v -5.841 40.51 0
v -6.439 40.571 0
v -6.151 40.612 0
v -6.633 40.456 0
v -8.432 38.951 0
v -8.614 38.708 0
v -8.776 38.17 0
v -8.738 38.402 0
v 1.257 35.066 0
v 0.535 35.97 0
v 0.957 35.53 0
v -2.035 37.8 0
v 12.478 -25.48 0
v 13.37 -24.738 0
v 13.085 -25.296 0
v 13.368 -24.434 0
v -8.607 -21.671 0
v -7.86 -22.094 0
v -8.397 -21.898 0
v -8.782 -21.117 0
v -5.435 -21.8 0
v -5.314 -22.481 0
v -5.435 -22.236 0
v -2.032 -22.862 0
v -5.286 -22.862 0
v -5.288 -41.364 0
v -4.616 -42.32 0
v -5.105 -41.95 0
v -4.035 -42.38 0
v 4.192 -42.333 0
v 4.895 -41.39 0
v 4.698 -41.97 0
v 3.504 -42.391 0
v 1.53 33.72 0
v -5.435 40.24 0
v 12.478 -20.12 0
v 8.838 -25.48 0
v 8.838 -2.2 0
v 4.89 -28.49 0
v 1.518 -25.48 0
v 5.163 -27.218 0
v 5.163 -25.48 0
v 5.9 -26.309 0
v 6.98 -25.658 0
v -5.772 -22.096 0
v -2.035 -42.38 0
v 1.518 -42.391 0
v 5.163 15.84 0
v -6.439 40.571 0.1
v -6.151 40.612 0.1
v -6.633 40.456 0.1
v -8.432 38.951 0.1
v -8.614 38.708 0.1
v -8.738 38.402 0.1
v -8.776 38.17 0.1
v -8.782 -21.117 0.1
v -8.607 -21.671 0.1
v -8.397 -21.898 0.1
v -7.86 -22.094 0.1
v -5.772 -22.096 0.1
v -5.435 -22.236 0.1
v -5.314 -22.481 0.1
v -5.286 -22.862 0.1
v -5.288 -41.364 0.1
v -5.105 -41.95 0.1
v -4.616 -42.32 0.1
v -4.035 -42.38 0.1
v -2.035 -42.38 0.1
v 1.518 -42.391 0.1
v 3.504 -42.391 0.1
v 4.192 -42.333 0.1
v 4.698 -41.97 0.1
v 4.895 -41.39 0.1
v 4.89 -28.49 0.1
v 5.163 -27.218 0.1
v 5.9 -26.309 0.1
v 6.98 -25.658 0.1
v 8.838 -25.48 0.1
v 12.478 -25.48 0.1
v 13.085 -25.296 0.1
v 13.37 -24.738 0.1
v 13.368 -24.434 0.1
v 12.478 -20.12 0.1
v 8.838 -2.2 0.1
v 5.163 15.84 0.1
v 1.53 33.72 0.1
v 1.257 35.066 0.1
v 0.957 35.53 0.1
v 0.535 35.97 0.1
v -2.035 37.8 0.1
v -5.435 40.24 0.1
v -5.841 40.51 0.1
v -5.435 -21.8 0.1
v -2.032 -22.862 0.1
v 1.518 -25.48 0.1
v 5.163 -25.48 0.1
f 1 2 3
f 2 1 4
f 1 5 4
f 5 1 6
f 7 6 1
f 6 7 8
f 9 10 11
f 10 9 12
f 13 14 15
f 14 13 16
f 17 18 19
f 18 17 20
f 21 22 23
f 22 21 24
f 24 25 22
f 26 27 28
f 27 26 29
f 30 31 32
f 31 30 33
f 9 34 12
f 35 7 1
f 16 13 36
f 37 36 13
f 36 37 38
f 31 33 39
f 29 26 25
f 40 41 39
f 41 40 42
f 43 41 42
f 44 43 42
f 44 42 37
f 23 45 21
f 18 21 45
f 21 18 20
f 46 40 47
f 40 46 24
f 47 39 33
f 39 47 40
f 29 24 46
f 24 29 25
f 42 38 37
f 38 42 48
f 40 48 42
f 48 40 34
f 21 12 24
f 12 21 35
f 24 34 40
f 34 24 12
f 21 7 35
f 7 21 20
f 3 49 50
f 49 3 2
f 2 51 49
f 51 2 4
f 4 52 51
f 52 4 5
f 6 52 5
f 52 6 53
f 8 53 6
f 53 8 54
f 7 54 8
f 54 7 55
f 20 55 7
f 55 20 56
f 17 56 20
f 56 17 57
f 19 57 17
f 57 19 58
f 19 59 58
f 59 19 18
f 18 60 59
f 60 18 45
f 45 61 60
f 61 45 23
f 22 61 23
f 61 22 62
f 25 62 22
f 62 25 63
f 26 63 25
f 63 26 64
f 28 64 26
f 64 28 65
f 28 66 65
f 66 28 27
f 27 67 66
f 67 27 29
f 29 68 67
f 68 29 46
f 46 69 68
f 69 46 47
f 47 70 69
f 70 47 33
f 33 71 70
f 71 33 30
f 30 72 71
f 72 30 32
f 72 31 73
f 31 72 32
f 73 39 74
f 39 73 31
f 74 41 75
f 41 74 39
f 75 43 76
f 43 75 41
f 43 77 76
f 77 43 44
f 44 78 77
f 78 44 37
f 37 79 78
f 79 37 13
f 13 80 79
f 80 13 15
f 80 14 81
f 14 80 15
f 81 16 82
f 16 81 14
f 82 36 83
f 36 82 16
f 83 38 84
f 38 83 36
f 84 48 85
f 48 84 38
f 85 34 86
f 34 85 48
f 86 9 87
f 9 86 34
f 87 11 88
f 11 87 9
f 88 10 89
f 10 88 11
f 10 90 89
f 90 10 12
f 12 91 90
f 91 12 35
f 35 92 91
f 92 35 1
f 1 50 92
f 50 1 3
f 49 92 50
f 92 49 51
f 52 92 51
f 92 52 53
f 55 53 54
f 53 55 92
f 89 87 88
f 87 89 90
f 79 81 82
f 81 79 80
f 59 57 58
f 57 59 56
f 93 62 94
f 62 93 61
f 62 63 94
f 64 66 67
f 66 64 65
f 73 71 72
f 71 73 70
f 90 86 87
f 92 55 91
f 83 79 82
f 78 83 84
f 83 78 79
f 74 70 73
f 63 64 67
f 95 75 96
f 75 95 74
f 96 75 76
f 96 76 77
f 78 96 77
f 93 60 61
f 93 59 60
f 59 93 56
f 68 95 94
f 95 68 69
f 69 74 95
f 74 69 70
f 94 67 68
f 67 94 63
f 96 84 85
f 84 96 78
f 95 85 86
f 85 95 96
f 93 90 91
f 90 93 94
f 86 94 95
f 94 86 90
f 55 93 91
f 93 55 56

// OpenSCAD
// file: ../p/4-4edge.scad
use <../lib.scad>
$fa=1; $fs=0.2;
function ldraw_lib__4_4edge(realsolid=false) = [
// 0 Circle 1.0
// 0 Name: 4-4edge.dat
// 0 Author: James Jessiman
// 0 !LDRAW_ORG Primitive UPDATE 2017-01
// 0 !LICENSE Licensed under CC BY 2.0 and CC BY 4.0 : see CAreadme.txt
// 
// 0 BFC CERTIFY CCW
  [0,"BFC","CERTIFY"],
  [0,"BFC","CCW"],
// 
// 0 !HISTORY 1998-12-15 [PTadmin] Official Update 1998-10
// 0 !HISTORY 2005-12-28 [PTadmin] Official Update 2005-01
// 0 !HISTORY 2007-06-24 [PTadmin] Header formatted for Contributor Agreement
// 0 !HISTORY 2008-07-01 [PTadmin] Official Update 2008-01
// 0 !HISTORY 2017-01-15 [Steffen] BFCed
// 0 !HISTORY 2017-12-30 [PTadmin] Official Update 2017-01
// 
// 
// 2 24 1 0 0 0.9239 0 0.3827
  [2,24,1,0,0,0.9239,0,0.3827],
// 2 24 0.9239 0 0.3827 0.7071 0 0.7071
  [2,24,0.9239,0,0.3827,0.7071,0,0.7071],
// 2 24 0.7071 0 0.7071 0.3827 0 0.9239
  [2,24,0.7071,0,0.7071,0.3827,0,0.9239],
// 2 24 0.3827 0 0.9239 0 0 1
  [2,24,0.3827,0,0.9239,0,0,1],
// 2 24 0 0 1 -0.3827 0 0.9239
  [2,24,0,0,1,-0.3827,0,0.9239],
// 2 24 -0.3827 0 0.9239 -0.7071 0 0.7071
  [2,24,-0.3827,0,0.9239,-0.7071,0,0.7071],
// 2 24 -0.7071 0 0.7071 -0.9239 0 0.3827
  [2,24,-0.7071,0,0.7071,-0.9239,0,0.3827],
// 2 24 -0.9239 0 0.3827 -1 0 -0
  [2,24,-0.9239,0,0.3827,-1,0,-0],
// 2 24 -1 0 -0 -0.9239 0 -0.3827
  [2,24,-1,0,-0,-0.9239,0,-0.3827],
// 2 24 -0.9239 0 -0.3827 -0.7071 0 -0.7071
  [2,24,-0.9239,0,-0.3827,-0.7071,0,-0.7071],
// 2 24 -0.7071 0 -0.7071 -0.3827 0 -0.9239
  [2,24,-0.7071,0,-0.7071,-0.3827,0,-0.9239],
// 2 24 -0.3827 0 -0.9239 0 0 -1
  [2,24,-0.3827,0,-0.9239,0,0,-1],
// 2 24 0 0 -1 0.3827 0 -0.9239
  [2,24,0,0,-1,0.3827,0,-0.9239],
// 2 24 0.3827 0 -0.9239 0.7071 0 -0.7071
  [2,24,0.3827,0,-0.9239,0.7071,0,-0.7071],
// 2 24 0.7071 0 -0.7071 0.9239 0 -0.3827
  [2,24,0.7071,0,-0.7071,0.9239,0,-0.3827],
// 2 24 0.9239 0 -0.3827 1 0 0
  [2,24,0.9239,0,-0.3827,1,0,0],
];
module ldraw_lib__4_4edge(step=0, col=false, unit=2/5, alt=false, line=0.2, solid=!$preview)
    makepoly(ldraw_lib__4_4edge(solid), step=step, col=col, unit=unit, alt=alt, line=line, solid=solid);
ldraw_lib__4_4edge(line=0.2);
// file: ../p/4-4disc.scad
use <../lib.scad>
$fa=1; $fs=0.2;
function ldraw_lib__4_4disc(realsolid=false) = [
// 0 Disc 1.0
// 0 Name: 4-4disc.dat
// 0 Author: James Jessiman
// 0 !LDRAW_ORG Primitive UPDATE 2002-02
// 0 !LICENSE Licensed under CC BY 2.0 and CC BY 4.0 : see CAreadme.txt
// 
// 0 BFC CERTIFY CCW
  [0,"BFC","CERTIFY"],
  [0,"BFC","CCW"],
// 
// 0 !HISTORY 1998-12-15 [PTadmin] Official Update 1998-10
// 0 !HISTORY 2002-03-23 [sbliss] Added BFC statement
// 0 !HISTORY 2002-04-25 [PTadmin] Official Update 2002-02
// 0 !HISTORY 2007-06-24 [PTadmin] Header formatted for Contributor Agreement
// 0 !HISTORY 2008-07-01 [PTadmin] Official Update 2008-01
// 
// 
// 3 16 0 0 0 1 0 0 0.9239 0 0.3827
  [3,16,0,0,0,1,0,0,0.9239,0,0.3827],
// 3 16 0 0 0 0.9239 0 0.3827 0.7071 0 0.7071
  [3,16,0,0,0,0.9239,0,0.3827,0.7071,0,0.7071],
// 3 16 0 0 0 0.7071 0 0.7071 0.3827 0 0.9239
  [3,16,0,0,0,0.7071,0,0.7071,0.3827,0,0.9239],
// 3 16 0 0 0 0.3827 0 0.9239 0 0 1
  [3,16,0,0,0,0.3827,0,0.9239,0,0,1],
// 3 16 0 0 0 0 0 1 -0.3827 0 0.9239
  [3,16,0,0,0,0,0,1,-0.3827,0,0.9239],
// 3 16 0 0 0 -0.3827 0 0.9239 -0.7071 0 0.7071
  [3,16,0,0,0,-0.3827,0,0.9239,-0.7071,0,0.7071],
// 3 16 0 0 0 -0.7071 0 0.7071 -0.9239 0 0.3827
  [3,16,0,0,0,-0.7071,0,0.7071,-0.9239,0,0.3827],
// 3 16 0 0 0 -0.9239 0 0.3827 -1 0 -0
  [3,16,0,0,0,-0.9239,0,0.3827,-1,0,-0],
// 3 16 0 0 0 -1 0 -0 -0.9239 0 -0.3827
  [3,16,0,0,0,-1,0,-0,-0.9239,0,-0.3827],
// 3 16 0 0 0 -0.9239 0 -0.3827 -0.7071 0 -0.7071
  [3,16,0,0,0,-0.9239,0,-0.3827,-0.7071,0,-0.7071],
// 3 16 0 0 0 -0.7071 0 -0.7071 -0.3827 0 -0.9239
  [3,16,0,0,0,-0.7071,0,-0.7071,-0.3827,0,-0.9239],
// 3 16 0 0 0 -0.3827 0 -0.9239 0 0 -1
  [3,16,0,0,0,-0.3827,0,-0.9239,0,0,-1],
// 3 16 0 0 0 0 0 -1 0.3827 0 -0.9239
  [3,16,0,0,0,0,0,-1,0.3827,0,-0.9239],
// 3 16 0 0 0 0.3827 0 -0.9239 0.7071 0 -0.7071
  [3,16,0,0,0,0.3827,0,-0.9239,0.7071,0,-0.7071],
// 3 16 0 0 0 0.7071 0 -0.7071 0.9239 0 -0.3827
  [3,16,0,0,0,0.7071,0,-0.7071,0.9239,0,-0.3827],
// 3 16 0 0 0 0.9239 0 -0.3827 1 0 0
  [3,16,0,0,0,0.9239,0,-0.3827,1,0,0],
// 0
];
module ldraw_lib__4_4disc(step=0, col=false, unit=2/5, alt=false, line=0.2, solid=!$preview)
    makepoly(ldraw_lib__4_4disc(solid), step=step, col=col, unit=unit, alt=alt, line=line, solid=solid);
ldraw_lib__4_4disc(line=0.2);
// file: ../p/4-4cyli.scad
use <../lib.scad>
$fa=1; $fs=0.2;
function ldraw_lib__4_4cyli(realsolid=false) = [
// 0 Cylinder 1.0
// 0 Name: 4-4cyli.dat
// 0 Author: James Jessiman
// 0 !LDRAW_ORG Primitive UPDATE 2005-01
// 0 !LICENSE Licensed under CC BY 2.0 and CC BY 4.0 : see CAreadme.txt
// 
// 0 BFC CERTIFY CCW
  [0,"BFC","CERTIFY"],
  [0,"BFC","CCW"],
// 
// 0 !HISTORY 1998-12-15 [PTadmin] Official Update 1998-10
// 0 !HISTORY 2002-03-23 [sbliss] Added BFC statement; merged headers from files in distributions LDraw 0.27 and Complete.
// 0 !HISTORY 2002-04-25 [PTadmin] Official Update 2002-02
// 0 !HISTORY 2004-12-14 [guyvivan] BFC CCW
// 0 !HISTORY 2005-12-28 [PTadmin] Official Update 2005-01
// 0 !HISTORY 2007-06-24 [PTadmin] Header formatted for Contributor Agreement
// 0 !HISTORY 2008-07-01 [PTadmin] Official Update 2008-01
// 
// 
// 4 16 1 1 0 0.9239 1 0.3827 0.9239 0 0.3827 1 0 0
  [4,16,1,1,0,0.9239,1,0.3827,0.9239,0,0.3827,1,0,0],
// 5 24 1 0 0 1 1 0 0.9239 0 0.3827 0.9239 0 -0.3827
  [5,24,1,0,0,1,1,0,0.9239,0,0.3827,0.9239,0,-0.3827],
// 4 16 0.9239 1 0.3827 0.7071 1 0.7071 0.7071 0 0.7071 0.9239 0 0.3827
  [4,16,0.9239,1,0.3827,0.7071,1,0.7071,0.7071,0,0.7071,0.9239,0,0.3827],
// 5 24 0.9239 0 0.3827 0.9239 1 0.3827 0.7071 0 0.7071 1 0 0
  [5,24,0.9239,0,0.3827,0.9239,1,0.3827,0.7071,0,0.7071,1,0,0],
// 4 16 0.7071 1 0.7071 0.3827 1 0.9239 0.3827 0 0.9239 0.7071 0 0.7071
  [4,16,0.7071,1,0.7071,0.3827,1,0.9239,0.3827,0,0.9239,0.7071,0,0.7071],
// 5 24 0.7071 0 0.7071 0.7071 1 0.7071 0.3827 0 0.9239 0.9239 0 0.3827
  [5,24,0.7071,0,0.7071,0.7071,1,0.7071,0.3827,0,0.9239,0.9239,0,0.3827],
// 4 16 0.3827 1 0.9239 0 1 1 0 0 1 0.3827 0 0.9239
  [4,16,0.3827,1,0.9239,0,1,1,0,0,1,0.3827,0,0.9239],
// 5 24 0.3827 0 0.9239 0.3827 1 0.9239 0 0 1 0.7071 0 0.7071
  [5,24,0.3827,0,0.9239,0.3827,1,0.9239,0,0,1,0.7071,0,0.7071],
// 4 16 0 1 1 -0.3827 1 0.9239 -0.3827 0 0.9239 0 0 1
  [4,16,0,1,1,-0.3827,1,0.9239,-0.3827,0,0.9239,0,0,1],
// 5 24 0 0 1 0 1 1 -0.3827 0 0.9239 0.3827 0 0.9239
  [5,24,0,0,1,0,1,1,-0.3827,0,0.9239,0.3827,0,0.9239],
// 4 16 -0.3827 1 0.9239 -0.7071 1 0.7071 -0.7071 0 0.7071 -0.3827 0 0.9239
  [4,16,-0.3827,1,0.9239,-0.7071,1,0.7071,-0.7071,0,0.7071,-0.3827,0,0.9239],
// 5 24 -0.3827 0 0.9239 -0.3827 1 0.9239 -0.7071 0 0.7071 0 0 1
  [5,24,-0.3827,0,0.9239,-0.3827,1,0.9239,-0.7071,0,0.7071,0,0,1],
// 4 16 -0.7071 1 0.7071 -0.9239 1 0.3827 -0.9239 0 0.3827 -0.7071 0 0.7071
  [4,16,-0.7071,1,0.7071,-0.9239,1,0.3827,-0.9239,0,0.3827,-0.7071,0,0.7071],
// 5 24 -0.7071 0 0.7071 -0.7071 1 0.7071 -0.9239 0 0.3827 -0.3827 0 0.9239
  [5,24,-0.7071,0,0.7071,-0.7071,1,0.7071,-0.9239,0,0.3827,-0.3827,0,0.9239],
// 4 16 -0.9239 1 0.3827 -1 1 0 -1 0 0 -0.9239 0 0.3827
  [4,16,-0.9239,1,0.3827,-1,1,0,-1,0,0,-0.9239,0,0.3827],
// 5 24 -0.9239 0 0.3827 -0.9239 1 0.3827 -1 0 0 -0.7071 0 0.7071
  [5,24,-0.9239,0,0.3827,-0.9239,1,0.3827,-1,0,0,-0.7071,0,0.7071],
// 4 16 -1 1 0 -0.9239 1 -0.3827 -0.9239 0 -0.3827 -1 0 0
  [4,16,-1,1,0,-0.9239,1,-0.3827,-0.9239,0,-0.3827,-1,0,0],
// 5 24 -1 0 0 -1 1 0 -0.9239 0 -0.3827 -0.9239 0 0.3827
  [5,24,-1,0,0,-1,1,0,-0.9239,0,-0.3827,-0.9239,0,0.3827],
// 4 16 -0.9239 1 -0.3827 -0.7071 1 -0.7071 -0.7071 0 -0.7071 -0.9239 0 -0.3827
  [4,16,-0.9239,1,-0.3827,-0.7071,1,-0.7071,-0.7071,0,-0.7071,-0.9239,0,-0.3827],
// 5 24 -0.9239 0 -0.3827 -0.9239 1 -0.3827 -0.7071 0 -0.7071 -1 0 0
  [5,24,-0.9239,0,-0.3827,-0.9239,1,-0.3827,-0.7071,0,-0.7071,-1,0,0],
// 4 16 -0.7071 1 -0.7071 -0.3827 1 -0.9239 -0.3827 0 -0.9239 -0.7071 0 -0.7071
  [4,16,-0.7071,1,-0.7071,-0.3827,1,-0.9239,-0.3827,0,-0.9239,-0.7071,0,-0.7071],
// 5 24 -0.7071 0 -0.7071 -0.7071 1 -0.7071 -0.3827 0 -0.9239 -0.9239 0 -0.3827
  [5,24,-0.7071,0,-0.7071,-0.7071,1,-0.7071,-0.3827,0,-0.9239,-0.9239,0,-0.3827],
// 4 16 -0.3827 1 -0.9239 0 1 -1 0 0 -1 -0.3827 0 -0.9239
  [4,16,-0.3827,1,-0.9239,0,1,-1,0,0,-1,-0.3827,0,-0.9239],
// 5 24 -0.3827 0 -0.9239 -0.3827 1 -0.9239 0 0 -1 -0.7071 0 -0.7071
  [5,24,-0.3827,0,-0.9239,-0.3827,1,-0.9239,0,0,-1,-0.7071,0,-0.7071],
// 4 16 0 1 -1 0.3827 1 -0.9239 0.3827 0 -0.9239 0 0 -1
  [4,16,0,1,-1,0.3827,1,-0.9239,0.3827,0,-0.9239,0,0,-1],
// 5 24 0 0 -1 0 1 -1 0.3827 0 -0.9239 -0.3827 0 -0.9239
  [5,24,0,0,-1,0,1,-1,0.3827,0,-0.9239,-0.3827,0,-0.9239],
// 4 16 0.3827 1 -0.9239 0.7071 1 -0.7071 0.7071 0 -0.7071 0.3827 0 -0.9239
  [4,16,0.3827,1,-0.9239,0.7071,1,-0.7071,0.7071,0,-0.7071,0.3827,0,-0.9239],
// 5 24 0.3827 0 -0.9239 0.3827 1 -0.9239 0.7071 0 -0.7071 0 0 -1
  [5,24,0.3827,0,-0.9239,0.3827,1,-0.9239,0.7071,0,-0.7071,0,0,-1],
// 4 16 0.7071 1 -0.7071 0.9239 1 -0.3827 0.9239 0 -0.3827 0.7071 0 -0.7071
  [4,16,0.7071,1,-0.7071,0.9239,1,-0.3827,0.9239,0,-0.3827,0.7071,0,-0.7071],
// 5 24 0.7071 0 -0.7071 0.7071 1 -0.7071 0.9239 0 -0.3827 0.3827 0 -0.9239
  [5,24,0.7071,0,-0.7071,0.7071,1,-0.7071,0.9239,0,-0.3827,0.3827,0,-0.9239],
// 4 16 0.9239 1 -0.3827 1 1 0 1 0 0 0.9239 0 -0.3827
  [4,16,0.9239,1,-0.3827,1,1,0,1,0,0,0.9239,0,-0.3827],
// 5 24 0.9239 0 -0.3827 0.9239 1 -0.3827 1 0 0 0.7071 0 -0.7071
  [5,24,0.9239,0,-0.3827,0.9239,1,-0.3827,1,0,0,0.7071,0,-0.7071],
// 0
];
module ldraw_lib__4_4cyli(step=0, col=false, unit=2/5, alt=false, line=0.2, solid=!$preview)
    makepoly(ldraw_lib__4_4cyli(solid), step=step, col=col, unit=unit, alt=alt, line=line, solid=solid);
ldraw_lib__4_4cyli(line=0.2);
// file: ../p/stud3.scad
use <../lib.scad>
use <4-4cyli.scad>
use <4-4disc.scad>
use <4-4edge.scad>
$fa=1; $fs=0.2;
function ldraw_lib__stud3(realsolid=false) = realsolid ? 
    [openscad(translate([0,0,-eps()], o=cylinder(4+eps(), r=4)),2)] : [
// 0 Stud Tube Solid
// 0 Name: stud3.dat
// 0 Author: James Jessiman
// 0 !LDRAW_ORG Primitive UPDATE 2012-01
// 0 !LICENSE Licensed under CC BY 2.0 and CC BY 4.0 : see CAreadme.txt
// 
// 0 BFC CERTIFY CCW
  [0,"BFC","CERTIFY"],
  [0,"BFC","CCW"],
// 
// 0 !HISTORY 2002-04-04 [sbliss] Modified for BFC compliance
// 0 !HISTORY 2002-04-25 [PTadmin] Official Update 2002-02
// 0 !HISTORY 2007-06-24 [PTadmin] Header formatted for Contributor Agreement
// 0 !HISTORY 2008-07-01 [PTadmin] Official Update 2008-01
// 0 !HISTORY 2012-02-16 [Philo] Changed to CCW
// 0 !HISTORY 2012-03-30 [PTadmin] Official Update 2012-01
// 
// 
// 1 16 0 -4 0 4 0 0 0 1 0 0 0 4 4-4edge.dat
  [1,16,0,-4,0,4,0,0,0,1,0,0,0,4, ldraw_lib__4_4edge(realsolid)],
// 1 16 0 0 0 4 0 0 0 1 0 0 0 4 4-4edge.dat
  [1,16,0,0,0,4,0,0,0,1,0,0,0,4, ldraw_lib__4_4edge(realsolid)],
// 1 16 0 -4 0 4 0 0 0 1 0 0 0 4 4-4disc.dat
  [1,16,0,-4,0,4,0,0,0,1,0,0,0,4, ldraw_lib__4_4disc(realsolid)],
// 1 16 0 -4 0 4 0 0 0 4 0 0 0 4 4-4cyli.dat
  [1,16,0,-4,0,4,0,0,0,4,0,0,0,4, ldraw_lib__4_4cyli(realsolid)],
];
module ldraw_lib__stud3(step=0, col=false, unit=2/5, alt=false, line=0.2, solid=!$preview)
    makepoly(ldraw_lib__stud3(solid), step=step, col=col, unit=unit, alt=alt, line=line, solid=solid);
ldraw_lib__stud3(line=0.2);
// file: ../p/stud.scad
use <../lib.scad>
use <4-4cyli.scad>
use <4-4disc.scad>
use <4-4edge.scad>
$fa=1; $fs=0.2;
function ldraw_lib__stud(realsolid=false) = realsolid ? 
    [openscad(translate([0,0,-eps()], o=cylinder(4+eps(), r=6)),2)] : [
// 0 Stud
// 0 Name: stud.dat
// 0 Author: James Jessiman
// 0 !LDRAW_ORG Primitive UPDATE 2012-01
// 0 !LICENSE Licensed under CC BY 2.0 and CC BY 4.0 : see CAreadme.txt
// 
// 0 BFC CERTIFY CCW
  [0,"BFC","CERTIFY"],
  [0,"BFC","CCW"],
// 
// 0 !HISTORY 2002-04-04 [sbliss] Modified for BFC compliance
// 0 !HISTORY 2002-04-25 [PTadmin] Official Update 2002-02
// 0 !HISTORY 2007-06-24 [PTadmin] Header formatted for Contributor Agreement
// 0 !HISTORY 2008-07-01 [PTadmin] Official Update 2008-01
// 0 !HISTORY 2012-02-16 [Philo] Changed to CCW
// 0 !HISTORY 2012-03-30 [PTadmin] Official Update 2012-01
// 
// 
// 1 16 0 0 0 6 0 0 0 1 0 0 0 6 4-4edge.dat
  [1,16,0,0,0,6,0,0,0,1,0,0,0,6, ldraw_lib__4_4edge(realsolid)],
// 1 16 0 -4 0 6 0 0 0 1 0 0 0 6 4-4edge.dat
  [1,16,0,-4,0,6,0,0,0,1,0,0,0,6, ldraw_lib__4_4edge(realsolid)],
// 1 16 0 0 0 6 0 0 0 -4 0 0 0 6 4-4cyli.dat
  [1,16,0,0,0,6,0,0,0,-4,0,0,0,6, ldraw_lib__4_4cyli(realsolid)],
// 1 16 0 -4 0 6 0 0 0 1 0 0 0 6 4-4disc.dat
  [1,16,0,-4,0,6,0,0,0,1,0,0,0,6, ldraw_lib__4_4disc(realsolid)],
];
module ldraw_lib__stud(step=0, col=false, unit=2/5, alt=false, line=0.2, solid=!$preview)
    makepoly(ldraw_lib__stud(solid), step=step, col=col, unit=unit, alt=alt, line=line, solid=solid);
ldraw_lib__stud(line=0.2);
// file: ../p/box5.scad
use <../lib.scad>
$fa=1; $fs=0.2;
function ldraw_lib__box5(realsolid=false) = [
// 0 Box with 5 Faces and All Edges
// 0 Name: box5.dat
// 0 Author: James Jessiman
// 0 !LDRAW_ORG Primitive UPDATE 2012-01
// 0 !LICENSE Licensed under CC BY 2.0 and CC BY 4.0 : see CAreadme.txt
// 
// 0 BFC CERTIFY CCW
  [0,"BFC","CERTIFY"],
  [0,"BFC","CCW"],
// 
// 0 !HISTORY 2002-04-03 [sbliss] Modified for BFC compliance
// 0 !HISTORY 2002-04-25 [PTadmin] Official Update 2002-02
// 0 !HISTORY 2007-06-24 [PTadmin] Header formatted for Contributor Agreement
// 0 !HISTORY 2008-07-01 [PTadmin] Official Update 2008-01
// 0 !HISTORY 2012-02-16 [Philo] Changed to CCW
// 0 !HISTORY 2012-03-30 [PTadmin] Official Update 2012-01
// 
// 
// 2 24 1 1 1 -1 1 1
  [2,24,1,1,1,-1,1,1],
// 2 24 -1 1 1 -1 1 -1
  [2,24,-1,1,1,-1,1,-1],
// 2 24 -1 1 -1 1 1 -1
  [2,24,-1,1,-1,1,1,-1],
// 2 24 1 1 -1 1 1 1
  [2,24,1,1,-1,1,1,1],
// 2 24 1 0 1 -1 0 1
  [2,24,1,0,1,-1,0,1],
// 2 24 -1 0 1 -1 0 -1
  [2,24,-1,0,1,-1,0,-1],
// 2 24 -1 0 -1 1 0 -1
  [2,24,-1,0,-1,1,0,-1],
// 2 24 1 0 -1 1 0 1
  [2,24,1,0,-1,1,0,1],
// 2 24 1 0 1 1 1 1
  [2,24,1,0,1,1,1,1],
// 2 24 -1 0 1 -1 1 1
  [2,24,-1,0,1,-1,1,1],
// 2 24 1 0 -1 1 1 -1
  [2,24,1,0,-1,1,1,-1],
// 2 24 -1 0 -1 -1 1 -1
  [2,24,-1,0,-1,-1,1,-1],
// 4 16 -1 1 1 1 1 1 1 1 -1 -1 1 -1
  [4,16,-1,1,1,1,1,1,1,1,-1,-1,1,-1],
// 4 16 -1 1 1 -1 0 1 1 0 1 1 1 1
  [4,16,-1,1,1,-1,0,1,1,0,1,1,1,1],
// 4 16 -1 1 -1 -1 0 -1 -1 0 1 -1 1 1
  [4,16,-1,1,-1,-1,0,-1,-1,0,1,-1,1,1],
// 4 16 1 1 -1 1 0 -1 -1 0 -1 -1 1 -1
  [4,16,1,1,-1,1,0,-1,-1,0,-1,-1,1,-1],
// 4 16 1 1 1 1 0 1 1 0 -1 1 1 -1
  [4,16,1,1,1,1,0,1,1,0,-1,1,1,-1],
];
module ldraw_lib__box5(step=0, col=false, unit=2/5, alt=false, line=0.2, solid=!$preview)
    makepoly(ldraw_lib__box5(solid), step=step, col=col, unit=unit, alt=alt, line=line, solid=solid);
ldraw_lib__box5(line=0.2);
// file: ../p/box4t.scad
use <../lib.scad>
$fa=1; $fs=0.2;
function ldraw_lib__box4t(realsolid=false) = [
// 0 Box with 4 Adjacent Faces and All Edges
// 0 Name: box4t.dat
// 0 Author: Tore Eriksson [Tore_Eriksson]
// 0 !LDRAW_ORG Primitive UPDATE 2003-02
// 0 !LICENSE Licensed under CC BY 2.0 and CC BY 4.0 : see CAreadme.txt
// 
// 0 BFC CERTIFY CCW
  [0,"BFC","CERTIFY"],
  [0,"BFC","CCW"],
// 
// 0 !HISTORY 1997-09-29 [PTadmin] Official Update 1997-15
// 0 !HISTORY 2002-08-31 [izanette] Modified with WINDZ for BFC compliance
// 0 !HISTORY 2003-08-01 [PTadmin] Official Update 2003-02
// 0 !HISTORY 2007-06-24 [PTadmin] Header formatted for Contributor Agreement
// 0 !HISTORY 2008-07-01 [PTadmin] Official Update 2008-01
// 
// 
// 2 24 1 1 1 -1 1 1
  [2,24,1,1,1,-1,1,1],
// 2 24 -1 1 1 -1 1 -1
  [2,24,-1,1,1,-1,1,-1],
// 2 24 -1 1 -1 1 1 -1
  [2,24,-1,1,-1,1,1,-1],
// 2 24 1 1 -1 1 1 1
  [2,24,1,1,-1,1,1,1],
// 2 24 1 0 1 -1 0 1
  [2,24,1,0,1,-1,0,1],
// 2 24 -1 0 1 -1 0 -1
  [2,24,-1,0,1,-1,0,-1],
// 2 24 -1 0 -1 1 0 -1
  [2,24,-1,0,-1,1,0,-1],
// 2 24 1 0 -1 1 0 1
  [2,24,1,0,-1,1,0,1],
// 2 24 1 0 1 1 1 1
  [2,24,1,0,1,1,1,1],
// 2 24 -1 0 1 -1 1 1
  [2,24,-1,0,1,-1,1,1],
// 2 24 1 0 -1 1 1 -1
  [2,24,1,0,-1,1,1,-1],
// 2 24 -1 0 -1 -1 1 -1
  [2,24,-1,0,-1,-1,1,-1],
// 4 16 1 1 1 1 1 -1 -1 1 -1 -1 1 1
  [4,16,1,1,1,1,1,-1,-1,1,-1,-1,1,1],
// 4 16 1 1 1 -1 1 1 -1 0 1 1 0 1
  [4,16,1,1,1,-1,1,1,-1,0,1,1,0,1],
// 4 16 -1 1 1 -1 1 -1 -1 0 -1 -1 0 1
  [4,16,-1,1,1,-1,1,-1,-1,0,-1,-1,0,1],
// 0 4 16 -1 1 -1 -1 0 -1 1 0 -1 1 1 -1
// 4 16 1 1 -1 1 1 1 1 0 1 1 0 -1
  [4,16,1,1,-1,1,1,1,1,0,1,1,0,-1],
// 0
];
module ldraw_lib__box4t(step=0, col=false, unit=2/5, alt=false, line=0.2, solid=!$preview)
    makepoly(ldraw_lib__box4t(solid), step=step, col=col, unit=unit, alt=alt, line=line, solid=solid);
ldraw_lib__box4t(line=0.2);
// file: s/3004s01.scad
use <../../lib.scad>
use <../../p/box4t.scad>
use <../../p/box5.scad>
use <../../p/stud.scad>
use <../../p/stud3.scad>
$fa=1; $fs=0.2;
function ldraw_lib__s__3004s01(realsolid=false) = [
// 0 ~Brick  1 x  2 without Front Face
// 0 Name: s\3004s01.dat
// 0 Author: James Jessiman
// 0 !LDRAW_ORG Subpart UPDATE 2003-03
// 0 !LICENSE Licensed under CC BY 2.0 and CC BY 4.0 : see CAreadme.txt
// 
// 0 BFC CERTIFY CCW
  [0,"BFC","CERTIFY"],
  [0,"BFC","CCW"],
// 
// 0 !HISTORY 2003-09-07 [jriley] Subfiling, BFC
// 0 !HISTORY 2003-12-19 [PTadmin] Official Update 2003-03
// 0 !HISTORY 2007-08-29 [PTadmin] Header formatted for Contributor Agreement
// 0 !HISTORY 2008-07-01 [PTadmin] Official Update 2008-01
// 
// 
// 1 16 0 4 0 1 0 0 0 -5 0 0 0 1 stud3.dat
  [1,16,0,4,0,1,0,0,0,-5,0,0,0,1, ldraw_lib__stud3(realsolid)],
// 0 BFC INVERTNEXT
  [0,"BFC","INVERTNEXT"],
// 1 16 0 24 0 16 0 0 0 -20 0 0 0 6 box5.dat
  [1,16,0,24,0,16,0,0,0,-20,0,0,0,6, ldraw_lib__box5(realsolid)],
// 4 16 20 24 10 16 24 6 -16 24 6 -20 24 10
  [4,16,20,24,10,16,24,6,-16,24,6,-20,24,10],
// 4 16 -20 24 10 -16 24 6 -16 24 -6 -20 24 -10
  [4,16,-20,24,10,-16,24,6,-16,24,-6,-20,24,-10],
// 4 16 -20 24 -10 -16 24 -6 16 24 -6 20 24 -10
  [4,16,-20,24,-10,-16,24,-6,16,24,-6,20,24,-10],
// 4 16 20 24 -10 16 24 -6 16 24 6 20 24 10
  [4,16,20,24,-10,16,24,-6,16,24,6,20,24,10],
// 1 16 0 24 0 20 0 0 0 -24 0 0 0 10 box4t.dat
  [1,16,0,24,0,20,0,0,0,-24,0,0,0,10, ldraw_lib__box4t(realsolid)],
// 1 16 10 0 0 1 0 0 0 1 0 0 0 1 stud.dat
  [1,16,10,0,0,1,0,0,0,1,0,0,0,1, ldraw_lib__stud(realsolid)],
// 1 16 -10 0 0 1 0 0 0 1 0 0 0 1 stud.dat
  [1,16,-10,0,0,1,0,0,0,1,0,0,0,1, ldraw_lib__stud(realsolid)],
// 0
];
module ldraw_lib__s__3004s01(step=0, col=false, unit=2/5, alt=false, line=0.2, solid=!$preview)
    makepoly(ldraw_lib__s__3004s01(solid), step=step, col=col, unit=unit, alt=alt, line=line, solid=solid);
ldraw_lib__s__3004s01(line=0.2);
// file: 3004.scad
use <../lib.scad>
use <s/3004s01.scad>
$fa=1; $fs=0.2;
function ldraw_lib__3004(realsolid=false) = [
// 0 Brick  1 x  2
// 0 Name: 3004.dat
// 0 Author: James Jessiman
// 0 !LDRAW_ORG Part UPDATE 2022-05
// 0 !LICENSE Licensed under CC BY 2.0 and CC BY 4.0 : see CAreadme.txt
// 
// 0 BFC CERTIFY CCW
  [0,"BFC","CERTIFY"],
  [0,"BFC","CCW"],
// 
// 0 !HISTORY 2001-10-26 [PTadmin] Official Update 2001-01
// 0 !HISTORY 2002-05-07 {unknown} BFC Certification
// 0 !HISTORY 2002-06-11 [PTadmin] Official Update 2002-03
// 0 !HISTORY 2007-05-07 [PTadmin] Header formatted for Contributor Agreement
// 0 !HISTORY 2008-07-01 [PTadmin] Official Update 2008-01
// 0 !HISTORY 2022-08-04 [MagFors] Using subfile
// 0 !HISTORY 2022-09-15 [PTadmin] Official Update 2022-05
// 
// 
// 1 16 0 0 0 1 0 0 0 1 0 0 0 1 s\3004s01.dat
  [1,16,0,0,0,1,0,0,0,1,0,0,0,1, ldraw_lib__s__3004s01(realsolid)],
// 4 16 -20 24 -10 20 24 -10 20 0 -10 -20 0 -10
  [4,16,-20,24,-10,20,24,-10,20,0,-10,-20,0,-10],
];
module ldraw_lib__3004(step=0, col=false, unit=2/5, alt=false, line=0.2, solid=!$preview)
    makepoly(ldraw_lib__3004(solid), step=step, col=col, unit=unit, alt=alt, line=line, solid=solid);
ldraw_lib__3004(line=0.2);
// file: s/13710gs02.scad
use <../../lib.scad>
$fa=1; $fs=0.2;
function ldraw_lib__s__13710gs02(realsolid=false) = [
// 0 ~Sticker Top for Technic Panel Fairing Smooth (Long) Flat
// 0 Name: s\13710gs02.dat
// 0 Author: Philippe Hurbain [Philo]
// 0 !LDRAW_ORG Subpart UPDATE 2022-02
// 0 !LICENSE Licensed under CC BY 2.0 and CC BY 4.0 : see CAreadme.txt
// 
// 0 BFC CERTIFY CCW
  [0,"BFC","CERTIFY"],
  [0,"BFC","CCW"],
// 
// 0 !HISTORY 2022-03-06 [PTadmin] Official Update 2022-02
// 
// 
// 0 // Top surface
// 4 16 -14.602 -0.25 101.275 -15.378 -0.25 101.529 -16.097 -0.25 101.427 -16.582 -0.25 101.141
  [4,16,-14.602,-0.25,101.275,-15.378,-0.25,101.529,-16.097,-0.25,101.427,-16.582,-0.25,101.141],
// 4 16 -14.602 -0.25 101.275 -16.582 -0.25 101.141 -21.08 -0.25 97.378 -21.536 -0.25 96.769
  [4,16,-14.602,-0.25,101.275,-16.582,-0.25,101.141,-21.08,-0.25,97.378,-21.536,-0.25,96.769],
// 4 16 -14.602 -0.25 101.275 -21.536 -0.25 96.769 -21.844 -0.25 96.005 -21.94 -0.25 95.424
  [4,16,-14.602,-0.25,101.275,-21.536,-0.25,96.769,-21.844,-0.25,96.005,-21.94,-0.25,95.424],
// 4 16 3.142 -0.25 87.664 2.393 -0.25 88.826 1.338 -0.25 89.925 -5.087 -0.25 94.5
  [4,16,3.142,-0.25,87.664,2.393,-0.25,88.826,1.338,-0.25,89.925,-5.087,-0.25,94.5],
// 4 16 31.196 -0.25 -63.7 32.713 -0.25 -63.241 33.424 -0.25 -61.844 33.421 -0.25 -61.086
  [4,16,31.196,-0.25,-63.7,32.713,-0.25,-63.241,33.424,-0.25,-61.844,33.421,-0.25,-61.086],
// 4 16 -21.954 -0.25 -52.792 -21.518 -0.25 -54.177 -20.993 -0.25 -54.745 -19.65 -0.25 -55.236
  [4,16,-21.954,-0.25,-52.792,-21.518,-0.25,-54.177,-20.993,-0.25,-54.745,-19.65,-0.25,-55.236],
// 4 16 -13.588 -0.25 -55.589 -13.286 -0.25 -56.203 -5.08 -0.25 -57.154 -13.588 -0.25 -54.5
  [4,16,-13.588,-0.25,-55.589,-13.286,-0.25,-56.203,-5.08,-0.25,-57.154,-13.588,-0.25,-54.5],
// 3 16 -13.286 -0.25 -56.203 -13.216 -0.25 -57.156 -5.08 -0.25 -57.154
  [3,16,-13.286,-0.25,-56.203,-13.216,-0.25,-57.156,-5.08,-0.25,-57.154],
// 4 16 -13.22 -0.25 -103.409 -12.762 -0.25 -104.875 -11.54 -0.25 -105.799 -10.088 -0.25 -105.95
  [4,16,-13.22,-0.25,-103.409,-12.762,-0.25,-104.875,-11.54,-0.25,-105.799,-10.088,-0.25,-105.95],
// 4 16 8.76 -0.25 -105.977 10.481 -0.25 -105.833 11.744 -0.25 -104.924 12.237 -0.25 -103.474
  [4,16,8.76,-0.25,-105.977,10.481,-0.25,-105.833,11.744,-0.25,-104.924,12.237,-0.25,-103.474],
// 3 16 -5.087 -0.25 94.5 3.826 -0.25 84.3 3.142 -0.25 87.664
  [3,16,-5.087,-0.25,94.5,3.826,-0.25,84.3,3.142,-0.25,87.664],
// 3 16 -14.602 -0.25 101.275 -21.94 -0.25 95.424 -13.588 -0.25 100.6
  [3,16,-14.602,-0.25,101.275,-21.94,-0.25,95.424,-13.588,-0.25,100.6],
// 3 16 31.196 -0.25 -50.3 31.196 -0.25 -63.7 33.421 -0.25 -61.086
  [3,16,31.196,-0.25,-50.3,31.196,-0.25,-63.7,33.421,-0.25,-61.086],
// 4 16 22.095 -0.25 -63.7 31.196 -0.25 -63.7 31.196 -0.25 -50.3 22.095 -0.25 -5.5
  [4,16,22.095,-0.25,-63.7,31.196,-0.25,-63.7,31.196,-0.25,-50.3,22.095,-0.25,-5.5],
// 3 16 12.225 -0.25 -71.225 8.76 -0.25 -105.977 12.237 -0.25 -103.474
  [3,16,12.225,-0.25,-71.225,8.76,-0.25,-105.977,12.237,-0.25,-103.474],
// 3 16 -13.216 -0.25 -57.156 -13.22 -0.25 -103.409 -10.088 -0.25 -105.95
  [3,16,-13.216,-0.25,-57.156,-13.22,-0.25,-103.409,-10.088,-0.25,-105.95],
// 4 16 3.795 -0.25 -63.7 12.225 -0.25 -71.225 12.908 -0.25 -68.044 12.908 -0.25 -63.7
  [4,16,3.795,-0.25,-63.7,12.225,-0.25,-71.225,12.908,-0.25,-68.044,12.908,-0.25,-63.7],
// 3 16 12.908 -0.25 -63.7 12.908 -0.25 -68.044 14.749 -0.25 -65.772
  [3,16,12.908,-0.25,-63.7,12.908,-0.25,-68.044,14.749,-0.25,-65.772],
// 3 16 12.908 -0.25 -63.7 14.749 -0.25 -65.772 17.451 -0.25 -64.144
  [3,16,12.908,-0.25,-63.7,14.749,-0.25,-65.772,17.451,-0.25,-64.144],
// 3 16 22.095 -0.25 -63.7 12.908 -0.25 -63.7 17.451 -0.25 -64.144
  [3,16,22.095,-0.25,-63.7,12.908,-0.25,-63.7,17.451,-0.25,-64.144],
// 3 16 -13.588 -0.25 -54.5 -14.429 -0.25 -55.241 -13.588 -0.25 -55.589
  [3,16,-13.588,-0.25,-54.5,-14.429,-0.25,-55.241,-13.588,-0.25,-55.589],
// 4 16 -19.65 -0.25 -55.236 -14.429 -0.25 -55.241 -13.588 -0.25 -54.5 -21.954 -0.25 -52.792
  [4,16,-19.65,-0.25,-55.236,-14.429,-0.25,-55.241,-13.588,-0.25,-54.5,-21.954,-0.25,-52.792],
// 4 16 -5.08 -0.25 -57.154 -5.087 -0.25 -105.95 3.795 -0.25 -105.977 3.795 -0.25 -63.7
  [4,16,-5.08,-0.25,-57.154,-5.087,-0.25,-105.95,3.795,-0.25,-105.977,3.795,-0.25,-63.7],
// 4 16 3.795 -0.25 -63.7 3.795 -0.25 -105.977 8.76 -0.25 -105.977 12.225 -0.25 -71.225
  [4,16,3.795,-0.25,-63.7,3.795,-0.25,-105.977,8.76,-0.25,-105.977,12.225,-0.25,-71.225],
// 4 16 -10.088 -0.25 -105.95 -5.087 -0.25 -105.95 -5.08 -0.25 -57.154 -13.216 -0.25 -57.156
  [4,16,-10.088,-0.25,-105.95,-5.087,-0.25,-105.95,-5.08,-0.25,-57.154,-13.216,-0.25,-57.156],
// 4 16 12.908 -0.25 -63.7 22.095 -0.25 -63.7 22.095 -0.25 -5.5 12.908 -0.25 39.6
  [4,16,12.908,-0.25,-63.7,22.095,-0.25,-63.7,22.095,-0.25,-5.5,12.908,-0.25,39.6],
// 4 16 3.795 -0.25 -63.7 12.908 -0.25 -63.7 12.908 -0.25 39.6 3.826 -0.25 84.3
  [4,16,3.795,-0.25,-63.7,12.908,-0.25,-63.7,12.908,-0.25,39.6,3.826,-0.25,84.3],
// 4 16 -5.087 -0.25 94.5 -13.588 -0.25 100.6 -13.588 -0.25 -54.5 -5.08 -0.25 -57.154
  [4,16,-5.087,-0.25,94.5,-13.588,-0.25,100.6,-13.588,-0.25,-54.5,-5.08,-0.25,-57.154],
// 4 16 3.826 -0.25 84.3 -5.087 -0.25 94.5 -5.08 -0.25 -57.154 3.795 -0.25 -63.7
  [4,16,3.826,-0.25,84.3,-5.087,-0.25,94.5,-5.08,-0.25,-57.154,3.795,-0.25,-63.7],
// 4 16 -13.588 -0.25 100.6 -21.94 -0.25 95.424 -21.954 -0.25 -52.792 -13.588 -0.25 -54.5
  [4,16,-13.588,-0.25,100.6,-21.94,-0.25,95.424,-21.954,-0.25,-52.792,-13.588,-0.25,-54.5],
];
module ldraw_lib__s__13710gs02(step=0, col=false, unit=2/5, alt=false, line=0.2, solid=!$preview)
    makepoly(ldraw_lib__s__13710gs02(solid), step=step, col=col, unit=unit, alt=alt, line=line, solid=solid);
ldraw_lib__s__13710gs02(line=0.2);
// main file
use <../lib.scad>
use <s/13710gs01.scad>
use <s/13710gs02.scad>
$fa=1; $fs=0.2;
function ldraw_lib__13710h(realsolid=false) = [
// 0 Sticker Mindstorms EV3 #8 for Panel Smooth Long (Needs Work)
// 0 Name: 13710h.dat
// 0 Author: Philippe Hurbain [Philo]
// 0 !LDRAW_ORG Part UPDATE 2022-02
// 0 !LICENSE Licensed under CC BY 2.0 and CC BY 4.0 : see CAreadme.txt
// 
// 0 !HELP To be used with panel 64393
// 
// 0 BFC CERTIFY CCW
  [0,"BFC","CERTIFY"],
  [0,"BFC","CCW"],
// 
// 0 !HISTORY 2022-03-06 [PTadmin] Official Update 2022-02
// 
// 
// 0 // Image file courtesy of the LEGO MINDSTORMS Team
// 0 // Needs Work: Missing more detailed fallback pattern
// 
// 1 16 0 0 0 1 0 0 0 1 0 0 0 1 s\13710gs01.dat
  [1,16,0,0,0,1,0,0,0,1,0,0,0,1, ldraw_lib__s__13710gs01(realsolid)],
// 0 !TEXMAP START PLANAR 33.424 12.0264 101.529 33.424 12.0264 -105.977 -21.954 12.0264 101.529 13710h.png
// 0 !: 1 15 0 0 0 1 0 0 0 1 0 0 0 1 s\13710gs02.dat
// 0 !TEXMAP FALLBACK
// 1 15 0 0 0 1 0 0 0 1 0 0 0 1 s\13710gs02.dat
  [1,15,0,0,0,1,0,0,0,1,0,0,0,1, ldraw_lib__s__13710gs02(realsolid)],
// 0 !TEXMAP END
];
module ldraw_lib__13710h(step=0, col=false, unit=2/5, alt=false, line=0.2, solid=!$preview)
    makepoly(ldraw_lib__13710h(solid), step=step, col=col, unit=unit, alt=alt, line=line, solid=solid);
ldraw_lib__13710h(line=0.2);
